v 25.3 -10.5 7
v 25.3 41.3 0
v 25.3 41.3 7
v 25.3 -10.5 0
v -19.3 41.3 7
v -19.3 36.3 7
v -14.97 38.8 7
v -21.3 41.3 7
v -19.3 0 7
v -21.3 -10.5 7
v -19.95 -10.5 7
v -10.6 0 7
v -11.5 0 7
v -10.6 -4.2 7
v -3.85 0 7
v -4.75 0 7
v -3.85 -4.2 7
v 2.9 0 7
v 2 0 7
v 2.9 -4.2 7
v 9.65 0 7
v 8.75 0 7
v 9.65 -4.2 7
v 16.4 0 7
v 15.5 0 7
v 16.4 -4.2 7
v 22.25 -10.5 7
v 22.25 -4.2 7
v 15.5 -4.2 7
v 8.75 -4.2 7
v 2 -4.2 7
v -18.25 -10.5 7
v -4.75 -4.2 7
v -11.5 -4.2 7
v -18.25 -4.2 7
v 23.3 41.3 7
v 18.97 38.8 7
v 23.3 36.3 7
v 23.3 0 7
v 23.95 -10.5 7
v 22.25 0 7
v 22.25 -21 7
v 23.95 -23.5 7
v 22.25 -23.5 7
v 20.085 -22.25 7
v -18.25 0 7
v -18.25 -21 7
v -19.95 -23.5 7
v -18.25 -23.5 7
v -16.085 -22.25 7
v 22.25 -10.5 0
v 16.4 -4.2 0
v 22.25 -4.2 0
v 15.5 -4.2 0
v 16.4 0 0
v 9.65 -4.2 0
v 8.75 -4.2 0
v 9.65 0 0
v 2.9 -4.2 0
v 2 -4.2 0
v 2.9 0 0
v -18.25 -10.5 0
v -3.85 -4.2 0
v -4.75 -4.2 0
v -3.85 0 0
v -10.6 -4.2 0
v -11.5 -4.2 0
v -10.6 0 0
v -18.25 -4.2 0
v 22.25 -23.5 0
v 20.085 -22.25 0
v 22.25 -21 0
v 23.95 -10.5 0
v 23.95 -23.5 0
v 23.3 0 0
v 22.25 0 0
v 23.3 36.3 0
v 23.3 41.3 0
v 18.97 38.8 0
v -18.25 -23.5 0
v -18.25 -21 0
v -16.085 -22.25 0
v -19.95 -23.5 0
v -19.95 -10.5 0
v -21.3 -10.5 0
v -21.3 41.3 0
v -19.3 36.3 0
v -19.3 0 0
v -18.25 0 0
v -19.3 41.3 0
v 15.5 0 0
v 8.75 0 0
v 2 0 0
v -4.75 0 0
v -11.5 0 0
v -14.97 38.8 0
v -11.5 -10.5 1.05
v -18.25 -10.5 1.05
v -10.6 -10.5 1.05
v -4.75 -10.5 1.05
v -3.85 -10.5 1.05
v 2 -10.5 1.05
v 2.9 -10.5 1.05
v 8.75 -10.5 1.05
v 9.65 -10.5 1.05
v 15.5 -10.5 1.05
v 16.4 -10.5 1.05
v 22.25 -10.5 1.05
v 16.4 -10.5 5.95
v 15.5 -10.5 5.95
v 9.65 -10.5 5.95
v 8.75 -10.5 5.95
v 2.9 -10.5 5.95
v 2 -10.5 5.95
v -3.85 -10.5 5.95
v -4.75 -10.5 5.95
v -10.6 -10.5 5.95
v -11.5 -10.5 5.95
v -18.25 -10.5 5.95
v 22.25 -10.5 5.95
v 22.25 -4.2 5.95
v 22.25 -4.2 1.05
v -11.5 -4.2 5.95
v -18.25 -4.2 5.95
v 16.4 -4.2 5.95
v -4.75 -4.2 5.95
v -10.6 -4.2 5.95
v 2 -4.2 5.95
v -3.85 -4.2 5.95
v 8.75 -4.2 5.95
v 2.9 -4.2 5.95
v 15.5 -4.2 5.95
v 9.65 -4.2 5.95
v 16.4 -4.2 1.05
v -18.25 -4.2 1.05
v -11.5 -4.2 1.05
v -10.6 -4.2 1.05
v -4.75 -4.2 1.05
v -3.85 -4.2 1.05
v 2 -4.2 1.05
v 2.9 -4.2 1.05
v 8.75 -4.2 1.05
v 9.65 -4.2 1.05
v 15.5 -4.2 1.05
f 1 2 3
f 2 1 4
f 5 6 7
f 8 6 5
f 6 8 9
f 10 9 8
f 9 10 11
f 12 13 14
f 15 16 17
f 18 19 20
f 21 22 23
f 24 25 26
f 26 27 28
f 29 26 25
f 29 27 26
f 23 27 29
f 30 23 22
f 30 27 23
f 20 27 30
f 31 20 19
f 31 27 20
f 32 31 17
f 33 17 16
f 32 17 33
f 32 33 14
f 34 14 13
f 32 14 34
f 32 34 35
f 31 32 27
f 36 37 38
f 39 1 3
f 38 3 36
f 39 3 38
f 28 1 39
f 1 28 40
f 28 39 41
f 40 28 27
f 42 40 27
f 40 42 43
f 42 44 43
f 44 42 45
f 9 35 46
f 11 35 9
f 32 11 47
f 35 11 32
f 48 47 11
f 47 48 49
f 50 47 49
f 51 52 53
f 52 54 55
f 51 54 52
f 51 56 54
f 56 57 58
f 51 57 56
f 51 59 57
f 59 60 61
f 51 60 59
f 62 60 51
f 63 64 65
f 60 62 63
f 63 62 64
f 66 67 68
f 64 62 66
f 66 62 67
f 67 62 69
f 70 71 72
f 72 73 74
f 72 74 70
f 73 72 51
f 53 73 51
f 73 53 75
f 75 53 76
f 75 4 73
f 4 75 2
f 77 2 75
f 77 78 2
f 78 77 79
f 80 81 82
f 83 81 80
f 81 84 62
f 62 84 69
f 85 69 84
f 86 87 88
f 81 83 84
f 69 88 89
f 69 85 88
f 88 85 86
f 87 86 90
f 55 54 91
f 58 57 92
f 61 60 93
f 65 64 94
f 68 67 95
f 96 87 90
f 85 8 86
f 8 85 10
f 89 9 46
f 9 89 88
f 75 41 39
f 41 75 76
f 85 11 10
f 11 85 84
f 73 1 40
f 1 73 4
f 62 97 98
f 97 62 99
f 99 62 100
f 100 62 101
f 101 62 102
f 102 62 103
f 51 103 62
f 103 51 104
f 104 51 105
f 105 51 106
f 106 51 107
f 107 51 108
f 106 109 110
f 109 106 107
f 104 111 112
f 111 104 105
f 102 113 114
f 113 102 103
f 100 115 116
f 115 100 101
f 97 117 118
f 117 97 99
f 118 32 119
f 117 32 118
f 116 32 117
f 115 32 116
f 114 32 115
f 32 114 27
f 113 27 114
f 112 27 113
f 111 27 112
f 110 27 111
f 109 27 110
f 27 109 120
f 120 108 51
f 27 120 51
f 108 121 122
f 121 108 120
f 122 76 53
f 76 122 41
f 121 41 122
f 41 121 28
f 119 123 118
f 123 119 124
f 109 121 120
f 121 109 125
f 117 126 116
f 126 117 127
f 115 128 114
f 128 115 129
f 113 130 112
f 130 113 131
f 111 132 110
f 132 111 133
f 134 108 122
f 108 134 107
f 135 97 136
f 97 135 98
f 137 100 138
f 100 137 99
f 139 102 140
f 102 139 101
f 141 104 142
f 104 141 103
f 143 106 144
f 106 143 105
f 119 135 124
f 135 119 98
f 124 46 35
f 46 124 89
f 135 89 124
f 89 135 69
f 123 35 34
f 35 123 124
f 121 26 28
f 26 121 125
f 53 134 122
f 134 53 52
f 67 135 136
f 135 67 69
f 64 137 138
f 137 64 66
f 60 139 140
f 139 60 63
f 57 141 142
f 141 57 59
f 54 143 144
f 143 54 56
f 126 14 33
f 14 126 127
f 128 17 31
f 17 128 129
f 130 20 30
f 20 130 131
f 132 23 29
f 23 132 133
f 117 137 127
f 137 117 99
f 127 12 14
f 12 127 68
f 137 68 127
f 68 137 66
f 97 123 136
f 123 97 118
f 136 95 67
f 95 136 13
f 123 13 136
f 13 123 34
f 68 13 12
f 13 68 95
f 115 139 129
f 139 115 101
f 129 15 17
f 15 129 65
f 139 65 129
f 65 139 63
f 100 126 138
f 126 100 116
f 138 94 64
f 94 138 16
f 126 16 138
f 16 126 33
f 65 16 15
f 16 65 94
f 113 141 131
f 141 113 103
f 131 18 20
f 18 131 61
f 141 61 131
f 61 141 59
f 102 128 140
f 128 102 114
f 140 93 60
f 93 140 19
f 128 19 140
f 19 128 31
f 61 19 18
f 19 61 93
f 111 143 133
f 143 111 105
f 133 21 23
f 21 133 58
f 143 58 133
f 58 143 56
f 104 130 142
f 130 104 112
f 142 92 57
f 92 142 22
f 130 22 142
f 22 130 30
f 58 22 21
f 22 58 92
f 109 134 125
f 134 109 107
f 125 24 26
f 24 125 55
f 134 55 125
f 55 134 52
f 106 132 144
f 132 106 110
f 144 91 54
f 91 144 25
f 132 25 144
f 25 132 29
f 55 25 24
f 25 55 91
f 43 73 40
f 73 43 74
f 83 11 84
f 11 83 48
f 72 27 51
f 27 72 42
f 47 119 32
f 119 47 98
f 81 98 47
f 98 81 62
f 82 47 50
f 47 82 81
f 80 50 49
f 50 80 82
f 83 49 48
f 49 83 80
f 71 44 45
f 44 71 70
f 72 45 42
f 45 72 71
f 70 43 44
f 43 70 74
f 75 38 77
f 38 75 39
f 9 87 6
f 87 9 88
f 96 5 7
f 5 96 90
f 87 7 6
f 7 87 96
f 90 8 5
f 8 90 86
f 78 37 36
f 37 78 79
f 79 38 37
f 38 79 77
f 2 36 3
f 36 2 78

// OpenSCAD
//Square to Square Clip
//Example is a Nema17 motor to fan mount
//but not limited to :-).
// Author: KonKop (Bryon Wheeler)


//The object with the largest width should go to Bigger
//The object with the smallest width should go to the Smaller

//Variables
ClipHeight = 7;


//Box with the Largest Width
/* [Largest Box] */   
BiggerWidth = 42.6;
BiggerDepth = 36.3; //to hookable groove
BiggerClipSize = 2; 
BigTeethSize = 5;

//Box with Smallest Width
/* [Smallest Box] */   
SmallerWidth = 40.5;
SmallerDepth = 10.5;
SmallerClipSize = 1.7;
SmallerTeethSize = 2.5;

//
ConnectorDepth = 10.5;
ConnectorWidth = BiggerWidth;


//Air hole in the connector for air
HoleWidth = SmallerWidth;
HoleHeight = ClipHeight * .7;

HoleCutOutWidth = HoleWidth;
HoleCutOut = ConnectorDepth * .4;

NumHoleSpacers = 5;
HoleSupportSpace = (HoleWidth / (NumHoleSpacers + 1));
HoleSupportWidth = .9;



/* 
Triangle
	a: Length of side a
	b: Length of side b
	angle: angle at point angleAB
*/
module Triangle(
			a, b, angle, height=1, heights=undef,
			center=undef, centerXYZ=[false,false,false])
{
	// Calculate Heights at each point
	heightAB = ((heights==undef) ? height : heights[0])/2;
	heightBC = ((heights==undef) ? height : heights[1])/2;
	heightCA = ((heights==undef) ? height : heights[2])/2;
	centerZ = (center || (center==undef && centerXYZ[2]))?0:max(heightAB,heightBC,heightCA);

	// Calculate Offsets for centering
	offsetX = (center || (center==undef && centerXYZ[0]))?((cos(angle)*a)+b)/3:0;
	offsetY = (center || (center==undef && centerXYZ[1]))?(sin(angle)*a)/3:0;
	
	pointAB1 = [-offsetX,-offsetY, centerZ-heightAB];
	pointAB2 = [-offsetX,-offsetY, centerZ+heightAB];
	pointBC1 = [b-offsetX,-offsetY, centerZ-heightBC];
	pointBC2 = [b-offsetX,-offsetY, centerZ+heightBC];
	pointCA1 = [(cos(angle)*a)-offsetX,(sin(angle)*a)-offsetY, centerZ-heightCA];
	pointCA2 = [(cos(angle)*a)-offsetX,(sin(angle)*a)-offsetY, centerZ+heightCA];

	polyhedron(
		points=[	pointAB1, pointBC1, pointCA1,
					pointAB2, pointBC2, pointCA2 ],	
        faces=[	
			[0, 1, 2],
			[3, 5, 4],
			[0, 3, 1],
			[1, 3, 4],
			[1, 4, 2],
			[2, 4, 5],
			[2, 5, 0],
			[0, 5, 3] ] );
}

/*
Equilateral Triangle
	Create a Equilateral Triangle.

	l: Length of all sides (a, b & c)
	H: Triangle size will be based on the this 2D height
		When using H, l is ignored.
*/
module Equilateral_Triangle(
			l=10, H=undef, height=1, heights=undef,
			center=undef, centerXYZ=[true,false,false])
{
	L = (H==undef)?l:H/sin(60);
	Triangle(a=L,b=L,angle=60,height=height, heights=heights,
				center=center, centerXYZ=centerXYZ);
}


module BiggerClip(){
    
    //Bigger Box
    difference(){
    cube(size = [BiggerWidth + (BiggerClipSize * 2),BiggerDepth,ClipHeight], center = false);
    
    translate([BiggerClipSize,0,0])
    cube(size = [BiggerWidth,BiggerDepth,ClipHeight], center = false);
    }
    
    //Teeth
    translate([BiggerClipSize,BiggerDepth+BigTeethSize/2,0]) rotate([0,0,-90]) Equilateral_Triangle(l=BigTeethSize, height = ClipHeight);
    translate([0,BiggerDepth,0])
    cube(size = [BiggerClipSize,BigTeethSize,ClipHeight], center = false);
    
    translate([BiggerClipSize + BiggerWidth,BiggerDepth+BigTeethSize/2,0]) rotate([0,0,90]) Equilateral_Triangle(l=BigTeethSize, height = ClipHeight);
    
    translate([BiggerClipSize + BiggerWidth,BiggerDepth,0])
    cube(size = [BiggerClipSize,BigTeethSize,ClipHeight], center = false);
}

module SmallerClip(){
    //Offset
    Offset = ((BiggerWidth + (BiggerClipSize * 2)) - (SmallerWidth + (SmallerClipSize * 2))) / 2;
    
    //Smaller Box
    translate([Offset,-(SmallerDepth + ConnectorDepth),0])
    difference(){
    cube(size = [SmallerWidth + (SmallerClipSize * 2),SmallerDepth,ClipHeight], center = false);
    
    translate([SmallerClipSize,0,0])
    cube(size = [SmallerWidth,SmallerDepth,ClipHeight], center = false);
    }
    
    //Teeth
    translate([Offset,-SmallerDepth*2 - ConnectorDepth,0])
    {
    translate([SmallerClipSize,SmallerDepth-SmallerTeethSize/2,0]) rotate([0,0,-90])      Equilateral_Triangle(l=SmallerTeethSize, height = ClipHeight);
    
    translate([SmallerClipSize,SmallerDepth-SmallerTeethSize,0])
    translate([-SmallerClipSize,0,0])
    cube(size = [SmallerClipSize,SmallerTeethSize,ClipHeight], center = false);
    
    
    translate([SmallerClipSize + SmallerWidth,SmallerDepth-SmallerTeethSize/2,0]) rotate([0,0,90]) Equilateral_Triangle(l=SmallerTeethSize, height = ClipHeight);
    
    translate([SmallerClipSize + SmallerWidth,SmallerDepth-SmallerTeethSize,0])
    //translate([SmallerClipSize,0,0])
    cube(size = [SmallerClipSize,SmallerTeethSize,ClipHeight], center = false);
    };
}

module SpacerBar(Xval,Depth, Yval){
    translate([Xval,Yval,0])
    cube(size = [HoleSupportWidth,Depth,ClipHeight], center = false);
}

module Connector(){
    SpacerX = ConnectorWidth + (BiggerClipSize * 2);
    translate([0,-SmallerDepth,0])
    {
        difference(){
            cube(size = [SpacerX,ConnectorDepth,ClipHeight], center = false);
        
            //air Hole
            translate([ (SpacerX - HoleWidth)/2,0,(ClipHeight - HoleHeight) / 2])
            cube(size = [HoleWidth,ConnectorDepth,HoleHeight], center = false);
                
//            //Air upper and lower gap    
            translate([ (SpacerX - HoleCutOutWidth)/2,ConnectorDepth-HoleCutOut,0])
            cube(size = [HoleCutOutWidth,HoleCutOut,ClipHeight], center = false);
            
            //support for gap
            //cube(size = [HoleCutOutWidth,HoleCutOut,ClipHeight], center = false);
                
        };
        
        SupportDepth = ConnectorDepth;
        //support bars
        for (a =[(SpacerX - HoleWidth)/2 + HoleSupportSpace:HoleSupportSpace:(SpacerX - HoleWidth)/2 + HoleWidth])SpacerBar(a,SupportDepth,0);
    }
}
translate([-BiggerWidth/2,0,0]){
Connector();
SmallerClip();
BiggerClip();
}
